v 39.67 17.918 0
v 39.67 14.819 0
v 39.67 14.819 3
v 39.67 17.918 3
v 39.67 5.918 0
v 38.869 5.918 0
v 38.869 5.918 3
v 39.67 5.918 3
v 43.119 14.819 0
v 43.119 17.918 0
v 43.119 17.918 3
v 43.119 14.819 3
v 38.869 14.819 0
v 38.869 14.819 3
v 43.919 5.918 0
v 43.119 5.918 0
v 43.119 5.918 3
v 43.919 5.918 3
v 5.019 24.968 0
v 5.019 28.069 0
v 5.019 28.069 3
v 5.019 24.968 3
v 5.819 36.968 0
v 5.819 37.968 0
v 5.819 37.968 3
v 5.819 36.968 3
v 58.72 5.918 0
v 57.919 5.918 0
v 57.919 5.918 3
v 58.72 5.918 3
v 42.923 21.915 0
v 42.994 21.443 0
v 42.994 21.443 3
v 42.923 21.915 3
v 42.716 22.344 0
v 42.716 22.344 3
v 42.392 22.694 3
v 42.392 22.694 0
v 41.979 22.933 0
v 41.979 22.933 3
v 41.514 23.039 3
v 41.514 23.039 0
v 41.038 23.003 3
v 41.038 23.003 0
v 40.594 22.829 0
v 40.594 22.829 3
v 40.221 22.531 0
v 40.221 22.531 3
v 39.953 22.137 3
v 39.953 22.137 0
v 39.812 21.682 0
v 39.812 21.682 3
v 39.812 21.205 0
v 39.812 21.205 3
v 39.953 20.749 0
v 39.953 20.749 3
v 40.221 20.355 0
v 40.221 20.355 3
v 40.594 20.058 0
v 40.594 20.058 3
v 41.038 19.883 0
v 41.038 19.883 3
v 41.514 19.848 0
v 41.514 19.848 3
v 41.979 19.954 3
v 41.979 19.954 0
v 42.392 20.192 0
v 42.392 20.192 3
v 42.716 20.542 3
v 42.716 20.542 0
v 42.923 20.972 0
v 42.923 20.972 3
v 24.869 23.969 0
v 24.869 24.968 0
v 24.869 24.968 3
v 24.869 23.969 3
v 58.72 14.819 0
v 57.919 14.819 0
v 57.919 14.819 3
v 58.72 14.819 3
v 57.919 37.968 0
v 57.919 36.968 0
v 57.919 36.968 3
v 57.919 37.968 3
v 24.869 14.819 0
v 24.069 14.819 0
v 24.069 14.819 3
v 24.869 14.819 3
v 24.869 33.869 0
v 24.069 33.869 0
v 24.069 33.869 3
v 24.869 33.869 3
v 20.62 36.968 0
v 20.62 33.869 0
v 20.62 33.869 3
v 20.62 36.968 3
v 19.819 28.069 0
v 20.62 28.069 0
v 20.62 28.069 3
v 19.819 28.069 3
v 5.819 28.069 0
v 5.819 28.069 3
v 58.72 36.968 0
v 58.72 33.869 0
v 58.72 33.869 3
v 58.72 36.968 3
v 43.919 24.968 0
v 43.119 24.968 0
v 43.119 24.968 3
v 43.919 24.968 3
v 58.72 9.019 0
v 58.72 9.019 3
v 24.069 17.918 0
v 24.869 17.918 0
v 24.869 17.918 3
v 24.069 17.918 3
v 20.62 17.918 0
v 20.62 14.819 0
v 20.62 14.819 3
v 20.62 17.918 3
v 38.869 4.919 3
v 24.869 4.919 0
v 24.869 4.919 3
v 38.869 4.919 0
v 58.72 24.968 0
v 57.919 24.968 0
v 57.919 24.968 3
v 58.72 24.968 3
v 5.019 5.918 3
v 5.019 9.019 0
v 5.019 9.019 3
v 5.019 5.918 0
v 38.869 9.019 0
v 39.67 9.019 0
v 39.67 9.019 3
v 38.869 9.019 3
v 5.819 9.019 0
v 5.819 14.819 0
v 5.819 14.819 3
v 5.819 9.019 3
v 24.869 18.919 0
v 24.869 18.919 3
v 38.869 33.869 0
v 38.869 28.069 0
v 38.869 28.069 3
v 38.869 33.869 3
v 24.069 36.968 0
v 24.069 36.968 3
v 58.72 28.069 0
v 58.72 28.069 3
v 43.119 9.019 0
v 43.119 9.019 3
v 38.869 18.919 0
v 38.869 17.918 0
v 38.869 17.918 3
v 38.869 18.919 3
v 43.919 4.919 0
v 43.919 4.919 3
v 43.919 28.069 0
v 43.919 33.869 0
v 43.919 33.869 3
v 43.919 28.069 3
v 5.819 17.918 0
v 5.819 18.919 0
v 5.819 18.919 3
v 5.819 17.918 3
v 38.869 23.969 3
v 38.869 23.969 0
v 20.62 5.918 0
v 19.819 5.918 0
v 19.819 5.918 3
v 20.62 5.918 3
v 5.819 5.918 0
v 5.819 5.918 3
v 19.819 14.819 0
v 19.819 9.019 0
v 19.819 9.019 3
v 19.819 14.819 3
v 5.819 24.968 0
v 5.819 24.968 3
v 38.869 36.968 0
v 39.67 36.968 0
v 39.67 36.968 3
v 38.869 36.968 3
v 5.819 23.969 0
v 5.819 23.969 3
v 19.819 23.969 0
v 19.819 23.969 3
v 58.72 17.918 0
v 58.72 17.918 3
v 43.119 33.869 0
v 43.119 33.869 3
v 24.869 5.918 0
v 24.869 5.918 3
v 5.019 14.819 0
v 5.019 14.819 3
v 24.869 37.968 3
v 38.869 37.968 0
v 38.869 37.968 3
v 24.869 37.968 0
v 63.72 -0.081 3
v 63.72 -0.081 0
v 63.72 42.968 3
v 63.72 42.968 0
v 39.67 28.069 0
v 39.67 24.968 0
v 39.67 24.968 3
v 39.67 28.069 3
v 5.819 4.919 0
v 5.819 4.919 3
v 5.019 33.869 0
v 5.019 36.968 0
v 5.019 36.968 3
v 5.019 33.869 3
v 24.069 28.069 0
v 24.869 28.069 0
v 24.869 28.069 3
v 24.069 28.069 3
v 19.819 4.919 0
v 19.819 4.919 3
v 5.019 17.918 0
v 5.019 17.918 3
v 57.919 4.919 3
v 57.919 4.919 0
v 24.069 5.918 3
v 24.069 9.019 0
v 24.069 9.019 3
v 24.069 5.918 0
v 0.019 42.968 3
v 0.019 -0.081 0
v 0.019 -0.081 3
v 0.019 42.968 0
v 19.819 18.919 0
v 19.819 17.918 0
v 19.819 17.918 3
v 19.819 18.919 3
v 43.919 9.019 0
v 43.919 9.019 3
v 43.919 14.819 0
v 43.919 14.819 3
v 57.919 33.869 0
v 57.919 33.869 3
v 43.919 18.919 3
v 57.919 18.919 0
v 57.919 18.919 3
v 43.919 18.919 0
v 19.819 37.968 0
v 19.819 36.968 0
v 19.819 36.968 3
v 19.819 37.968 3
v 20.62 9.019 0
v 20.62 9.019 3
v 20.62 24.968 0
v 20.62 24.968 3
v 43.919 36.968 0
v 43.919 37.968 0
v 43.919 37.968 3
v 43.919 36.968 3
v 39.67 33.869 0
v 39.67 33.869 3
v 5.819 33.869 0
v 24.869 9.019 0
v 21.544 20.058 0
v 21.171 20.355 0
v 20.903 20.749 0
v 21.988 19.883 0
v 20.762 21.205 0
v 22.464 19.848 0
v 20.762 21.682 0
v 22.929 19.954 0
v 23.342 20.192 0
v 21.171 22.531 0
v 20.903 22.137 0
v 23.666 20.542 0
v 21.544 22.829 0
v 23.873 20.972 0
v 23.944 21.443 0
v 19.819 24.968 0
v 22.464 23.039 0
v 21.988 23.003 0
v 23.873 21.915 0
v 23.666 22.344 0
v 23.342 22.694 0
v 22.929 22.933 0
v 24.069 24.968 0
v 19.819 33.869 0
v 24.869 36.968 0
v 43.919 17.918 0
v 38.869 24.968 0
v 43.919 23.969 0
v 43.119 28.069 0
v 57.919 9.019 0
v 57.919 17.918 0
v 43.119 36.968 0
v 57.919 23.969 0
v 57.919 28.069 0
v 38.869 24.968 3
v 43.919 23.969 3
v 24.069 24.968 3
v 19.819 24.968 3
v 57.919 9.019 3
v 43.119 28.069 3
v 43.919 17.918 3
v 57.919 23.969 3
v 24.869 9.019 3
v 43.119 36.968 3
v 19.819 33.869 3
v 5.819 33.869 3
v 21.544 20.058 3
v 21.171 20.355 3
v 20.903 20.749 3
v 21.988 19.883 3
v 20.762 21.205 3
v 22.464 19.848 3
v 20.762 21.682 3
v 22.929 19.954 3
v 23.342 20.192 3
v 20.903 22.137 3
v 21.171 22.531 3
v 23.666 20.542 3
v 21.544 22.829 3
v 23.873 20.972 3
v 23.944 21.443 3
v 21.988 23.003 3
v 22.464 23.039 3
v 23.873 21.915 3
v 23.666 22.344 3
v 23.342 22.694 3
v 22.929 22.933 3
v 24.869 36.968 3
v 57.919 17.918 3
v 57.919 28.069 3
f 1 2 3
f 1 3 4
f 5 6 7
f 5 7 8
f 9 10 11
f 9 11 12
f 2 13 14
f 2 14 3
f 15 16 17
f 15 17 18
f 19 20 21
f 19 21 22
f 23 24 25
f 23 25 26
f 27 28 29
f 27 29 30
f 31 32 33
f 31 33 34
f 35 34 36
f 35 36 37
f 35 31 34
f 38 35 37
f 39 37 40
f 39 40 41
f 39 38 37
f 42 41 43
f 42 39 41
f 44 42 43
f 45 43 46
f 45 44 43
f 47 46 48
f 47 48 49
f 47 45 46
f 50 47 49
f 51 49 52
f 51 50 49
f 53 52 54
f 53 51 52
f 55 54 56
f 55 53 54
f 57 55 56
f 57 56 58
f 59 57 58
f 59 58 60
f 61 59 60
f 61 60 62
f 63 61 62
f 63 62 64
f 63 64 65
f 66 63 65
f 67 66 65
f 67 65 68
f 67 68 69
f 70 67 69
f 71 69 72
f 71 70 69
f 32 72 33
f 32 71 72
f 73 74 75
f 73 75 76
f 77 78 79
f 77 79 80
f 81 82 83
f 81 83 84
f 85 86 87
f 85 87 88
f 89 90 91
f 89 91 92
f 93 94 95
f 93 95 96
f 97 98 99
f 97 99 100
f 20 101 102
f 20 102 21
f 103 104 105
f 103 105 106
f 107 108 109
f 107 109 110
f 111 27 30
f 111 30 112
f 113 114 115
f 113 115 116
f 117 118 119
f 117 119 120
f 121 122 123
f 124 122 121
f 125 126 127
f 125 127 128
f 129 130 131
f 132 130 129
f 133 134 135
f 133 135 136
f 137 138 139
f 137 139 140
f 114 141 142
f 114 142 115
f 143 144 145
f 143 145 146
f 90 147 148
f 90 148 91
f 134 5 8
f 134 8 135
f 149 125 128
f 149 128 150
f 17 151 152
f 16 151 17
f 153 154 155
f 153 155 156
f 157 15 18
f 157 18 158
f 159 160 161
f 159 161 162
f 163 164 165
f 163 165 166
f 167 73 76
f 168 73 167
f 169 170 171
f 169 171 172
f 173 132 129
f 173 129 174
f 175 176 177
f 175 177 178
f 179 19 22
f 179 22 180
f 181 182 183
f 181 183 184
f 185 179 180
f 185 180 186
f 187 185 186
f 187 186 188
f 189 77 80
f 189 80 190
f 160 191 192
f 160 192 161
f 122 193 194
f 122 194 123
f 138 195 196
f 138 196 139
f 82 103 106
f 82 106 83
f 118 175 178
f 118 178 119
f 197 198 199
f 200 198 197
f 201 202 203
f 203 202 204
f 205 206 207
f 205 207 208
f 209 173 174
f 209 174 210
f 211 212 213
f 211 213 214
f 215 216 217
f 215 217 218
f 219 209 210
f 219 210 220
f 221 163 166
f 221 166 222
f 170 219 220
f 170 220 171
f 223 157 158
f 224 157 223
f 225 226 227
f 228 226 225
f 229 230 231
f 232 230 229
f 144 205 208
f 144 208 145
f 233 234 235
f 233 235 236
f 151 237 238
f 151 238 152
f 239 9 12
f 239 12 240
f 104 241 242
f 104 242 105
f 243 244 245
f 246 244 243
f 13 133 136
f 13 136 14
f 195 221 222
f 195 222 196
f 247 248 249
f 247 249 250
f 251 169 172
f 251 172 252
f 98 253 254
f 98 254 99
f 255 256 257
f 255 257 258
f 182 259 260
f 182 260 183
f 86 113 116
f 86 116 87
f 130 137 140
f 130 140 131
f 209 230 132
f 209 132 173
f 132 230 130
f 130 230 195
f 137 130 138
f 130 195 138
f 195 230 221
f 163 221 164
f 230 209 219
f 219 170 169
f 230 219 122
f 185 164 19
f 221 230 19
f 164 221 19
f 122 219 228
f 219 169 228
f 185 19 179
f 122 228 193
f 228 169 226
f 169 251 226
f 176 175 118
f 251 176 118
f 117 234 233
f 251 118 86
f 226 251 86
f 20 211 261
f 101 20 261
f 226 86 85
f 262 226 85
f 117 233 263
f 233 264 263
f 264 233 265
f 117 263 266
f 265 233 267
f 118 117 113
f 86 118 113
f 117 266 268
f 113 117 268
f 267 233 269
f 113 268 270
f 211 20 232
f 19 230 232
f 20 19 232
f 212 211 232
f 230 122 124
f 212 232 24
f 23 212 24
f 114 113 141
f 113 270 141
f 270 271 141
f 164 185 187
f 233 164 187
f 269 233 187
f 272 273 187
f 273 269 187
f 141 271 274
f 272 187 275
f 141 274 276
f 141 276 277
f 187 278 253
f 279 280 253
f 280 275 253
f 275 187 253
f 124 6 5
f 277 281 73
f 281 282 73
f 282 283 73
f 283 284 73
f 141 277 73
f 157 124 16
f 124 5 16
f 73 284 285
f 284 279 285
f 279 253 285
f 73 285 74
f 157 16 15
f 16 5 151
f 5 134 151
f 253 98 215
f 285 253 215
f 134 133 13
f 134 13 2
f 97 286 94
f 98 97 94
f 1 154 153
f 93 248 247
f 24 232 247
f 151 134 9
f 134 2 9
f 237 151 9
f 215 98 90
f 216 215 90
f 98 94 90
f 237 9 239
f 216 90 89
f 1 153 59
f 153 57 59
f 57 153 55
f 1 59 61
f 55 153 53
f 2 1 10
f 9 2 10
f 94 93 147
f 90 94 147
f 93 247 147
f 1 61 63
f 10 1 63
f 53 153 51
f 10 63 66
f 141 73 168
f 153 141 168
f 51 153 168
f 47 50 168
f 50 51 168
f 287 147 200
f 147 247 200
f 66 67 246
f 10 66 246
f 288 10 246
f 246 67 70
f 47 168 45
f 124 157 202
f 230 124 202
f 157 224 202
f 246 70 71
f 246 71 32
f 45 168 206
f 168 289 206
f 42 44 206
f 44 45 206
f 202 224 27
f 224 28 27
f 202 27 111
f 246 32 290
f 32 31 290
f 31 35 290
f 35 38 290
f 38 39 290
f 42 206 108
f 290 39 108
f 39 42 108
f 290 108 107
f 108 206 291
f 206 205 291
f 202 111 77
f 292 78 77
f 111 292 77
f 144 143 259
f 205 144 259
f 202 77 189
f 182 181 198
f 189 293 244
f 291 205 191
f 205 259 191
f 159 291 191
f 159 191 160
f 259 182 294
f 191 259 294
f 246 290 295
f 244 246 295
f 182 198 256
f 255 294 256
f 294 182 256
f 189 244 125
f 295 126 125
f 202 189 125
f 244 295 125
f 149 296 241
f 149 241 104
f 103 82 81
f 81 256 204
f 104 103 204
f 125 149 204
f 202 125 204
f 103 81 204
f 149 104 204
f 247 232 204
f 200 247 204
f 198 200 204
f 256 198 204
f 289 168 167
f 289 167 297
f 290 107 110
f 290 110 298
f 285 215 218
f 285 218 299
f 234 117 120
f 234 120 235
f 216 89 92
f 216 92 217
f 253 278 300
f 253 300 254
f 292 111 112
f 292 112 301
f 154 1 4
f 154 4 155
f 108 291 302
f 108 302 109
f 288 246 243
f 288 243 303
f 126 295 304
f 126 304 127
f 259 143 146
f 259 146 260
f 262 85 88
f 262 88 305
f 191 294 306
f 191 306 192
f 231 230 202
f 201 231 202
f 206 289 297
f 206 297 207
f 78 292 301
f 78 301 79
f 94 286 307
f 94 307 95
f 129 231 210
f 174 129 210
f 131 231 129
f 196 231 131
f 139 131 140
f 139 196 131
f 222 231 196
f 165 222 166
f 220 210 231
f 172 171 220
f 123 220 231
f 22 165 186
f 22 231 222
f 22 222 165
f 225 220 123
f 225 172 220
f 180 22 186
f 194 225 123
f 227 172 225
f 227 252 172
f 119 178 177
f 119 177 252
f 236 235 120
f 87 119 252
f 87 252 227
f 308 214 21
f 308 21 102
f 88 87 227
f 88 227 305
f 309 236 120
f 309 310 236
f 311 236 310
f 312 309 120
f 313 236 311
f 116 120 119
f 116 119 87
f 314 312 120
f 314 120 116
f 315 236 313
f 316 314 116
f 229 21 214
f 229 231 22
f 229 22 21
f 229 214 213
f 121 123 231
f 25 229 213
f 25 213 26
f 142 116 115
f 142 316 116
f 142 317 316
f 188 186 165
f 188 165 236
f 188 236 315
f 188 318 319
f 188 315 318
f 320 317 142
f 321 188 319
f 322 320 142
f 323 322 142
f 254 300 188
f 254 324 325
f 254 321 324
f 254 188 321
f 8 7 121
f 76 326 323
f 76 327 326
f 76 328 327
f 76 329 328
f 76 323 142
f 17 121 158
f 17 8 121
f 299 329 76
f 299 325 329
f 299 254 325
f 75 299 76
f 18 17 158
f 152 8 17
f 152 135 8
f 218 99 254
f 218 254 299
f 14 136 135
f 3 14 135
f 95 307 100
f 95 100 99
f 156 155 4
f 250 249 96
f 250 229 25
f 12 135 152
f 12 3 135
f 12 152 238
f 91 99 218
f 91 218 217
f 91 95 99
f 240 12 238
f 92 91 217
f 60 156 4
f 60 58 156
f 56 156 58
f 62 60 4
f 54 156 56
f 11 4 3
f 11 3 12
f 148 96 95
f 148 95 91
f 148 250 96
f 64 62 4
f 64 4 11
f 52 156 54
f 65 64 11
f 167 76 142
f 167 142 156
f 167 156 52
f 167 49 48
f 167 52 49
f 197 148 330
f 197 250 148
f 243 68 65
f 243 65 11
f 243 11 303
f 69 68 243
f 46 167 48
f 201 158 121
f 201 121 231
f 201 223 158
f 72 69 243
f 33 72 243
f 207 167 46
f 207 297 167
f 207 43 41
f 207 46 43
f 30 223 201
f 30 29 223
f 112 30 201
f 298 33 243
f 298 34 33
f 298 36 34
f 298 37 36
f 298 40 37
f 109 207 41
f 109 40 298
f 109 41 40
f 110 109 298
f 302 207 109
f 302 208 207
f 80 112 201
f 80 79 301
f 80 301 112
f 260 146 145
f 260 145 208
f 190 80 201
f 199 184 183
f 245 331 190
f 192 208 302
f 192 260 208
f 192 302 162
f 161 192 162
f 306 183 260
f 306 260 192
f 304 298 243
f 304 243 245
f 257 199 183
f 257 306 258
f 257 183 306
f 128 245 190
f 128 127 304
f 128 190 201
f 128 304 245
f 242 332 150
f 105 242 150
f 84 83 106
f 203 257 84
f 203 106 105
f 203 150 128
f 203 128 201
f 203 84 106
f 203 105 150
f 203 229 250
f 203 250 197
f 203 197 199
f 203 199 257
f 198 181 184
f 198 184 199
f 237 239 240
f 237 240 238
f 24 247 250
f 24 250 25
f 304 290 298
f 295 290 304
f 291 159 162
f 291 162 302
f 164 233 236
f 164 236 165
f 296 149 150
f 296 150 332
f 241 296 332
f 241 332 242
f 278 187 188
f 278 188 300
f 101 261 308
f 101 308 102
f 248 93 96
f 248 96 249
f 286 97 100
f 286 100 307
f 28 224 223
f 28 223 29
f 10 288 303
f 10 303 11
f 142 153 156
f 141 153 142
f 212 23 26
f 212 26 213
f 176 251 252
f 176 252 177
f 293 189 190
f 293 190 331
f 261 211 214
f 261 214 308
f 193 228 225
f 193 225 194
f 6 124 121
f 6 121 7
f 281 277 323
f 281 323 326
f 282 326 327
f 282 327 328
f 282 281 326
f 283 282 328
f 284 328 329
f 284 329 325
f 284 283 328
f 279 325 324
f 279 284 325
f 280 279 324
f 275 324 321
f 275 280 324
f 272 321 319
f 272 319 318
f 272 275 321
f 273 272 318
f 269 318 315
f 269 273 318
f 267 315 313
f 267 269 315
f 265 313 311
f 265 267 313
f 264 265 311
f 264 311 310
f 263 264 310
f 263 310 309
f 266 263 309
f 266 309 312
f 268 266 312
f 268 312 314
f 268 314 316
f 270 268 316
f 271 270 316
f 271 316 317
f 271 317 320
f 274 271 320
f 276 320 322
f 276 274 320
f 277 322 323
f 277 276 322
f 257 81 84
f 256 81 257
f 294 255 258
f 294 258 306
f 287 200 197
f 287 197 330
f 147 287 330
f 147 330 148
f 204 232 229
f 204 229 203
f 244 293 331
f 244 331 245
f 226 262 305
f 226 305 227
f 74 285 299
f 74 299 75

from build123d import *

# Parameters (mm, degrees)
MODEL_W         = 63.70079
MODEL_H         = 43.04936
MODEL_R         = 1.6
EXTRUDE_1_DEPTH = 3


with BuildPart() as part:
    # Model → 凸台-拉伸1 (new body)
    with BuildSketch(Plane.XY):
        with Locations((31.869154462, 21.443783961)):
            Rectangle(MODEL_W, MODEL_H)
        with Locations((22.344199462, 21.443163961)):
            Circle(MODEL_R, mode=Mode.SUBTRACT)
        with Locations((41.394099462, 21.443163961)):
            Circle(MODEL_R, mode=Mode.SUBTRACT)
        Polygon((43.919449462, 18.918563961), (43.919449462, 17.918163961), (43.118649462, 17.918163961), (43.118649462, 14.818963961), (43.919449462, 14.818963961), (43.919449462, 9.018753961), (43.118649462, 9.018753961), (43.118649462, 5.918193961), (43.919449462, 5.918193961), (43.919449462, 4.919103961), (57.918749462, 4.919103961), (57.918749462, 5.918193961), (58.719549462, 5.918193961), (58.719549462, 9.018753961), (57.918749462, 9.018753961), (57.918749462, 14.818963961), (58.719549462, 14.818963961), (58.719549462, 17.918163961), (57.918749462, 17.918163961), (57.918749462, 18.918563961), align=None, mode=Mode.SUBTRACT)
        Polygon((24.869449462, 18.918563961), (24.869449462, 17.918163961), (24.068749462, 17.918163961), (24.068749462, 14.818963961), (24.869449462, 14.818963961), (24.869449462, 9.018753961), (24.068749462, 9.018753961), (24.068749462, 5.918193961), (24.869449462, 5.918193961), (24.869449462, 4.919103961), (38.868749462, 4.919103961), (38.868749462, 5.918193961), (39.669549462, 5.918193961), (39.669549462, 9.018753961), (38.868749462, 9.018753961), (38.868749462, 14.818963961), (39.669549462, 14.818963961), (39.669549462, 17.918163961), (38.868749462, 17.918163961), (38.868749462, 18.918563961), align=None, mode=Mode.SUBTRACT)
        Polygon((5.819399462, 18.918563961), (5.819399462, 17.918163961), (5.018759462, 17.918163961), (5.018759462, 14.818963961), (5.819399462, 14.818963961), (5.819399462, 9.018753961), (5.018759462, 9.018753961), (5.018759462, 5.918193961), (5.819399462, 5.918193961), (5.819399462, 4.919103961), (19.818949462, 4.919103961), (19.818949462, 5.918193961), (20.619549462, 5.918193961), (20.619549462, 9.018753961), (19.818949462, 9.018753961), (19.818949462, 14.818963961), (20.619549462, 14.818963961), (20.619549462, 17.918163961), (19.818949462, 17.918163961), (19.818949462, 18.918563961), align=None, mode=Mode.SUBTRACT)
        Polygon((43.919449462, 37.968463961), (43.919449462, 36.968163961), (43.118649462, 36.968163961), (43.118649462, 33.868963961), (43.919449462, 33.868963961), (43.919449462, 28.068763961), (43.118649462, 28.068763961), (43.118649462, 24.968163961), (43.919449462, 24.968163961), (43.919449462, 23.969063961), (57.918749462, 23.969063961), (57.918749462, 24.968163961), (58.719549462, 24.968163961), (58.719549462, 28.068763961), (57.918749462, 28.068763961), (57.918749462, 33.868963961), (58.719549462, 33.868963961), (58.719549462, 36.968163961), (57.918749462, 36.968163961), (57.918749462, 37.968463961), align=None, mode=Mode.SUBTRACT)
        Polygon((24.869449462, 37.968463961), (24.869449462, 36.968163961), (24.068749462, 36.968163961), (24.068749462, 33.868963961), (24.869449462, 33.868963961), (24.869449462, 28.068763961), (24.068749462, 28.068763961), (24.068749462, 24.968163961), (24.869449462, 24.968163961), (24.869449462, 23.969063961), (38.868749462, 23.969063961), (38.868749462, 24.968163961), (39.669549462, 24.968163961), (39.669549462, 28.068763961), (38.868749462, 28.068763961), (38.868749462, 33.868963961), (39.669549462, 33.868963961), (39.669549462, 36.968163961), (38.868749462, 36.968163961), (38.868749462, 37.968463961), align=None, mode=Mode.SUBTRACT)
        Polygon((5.819399462, 37.968463961), (5.819399462, 36.968163961), (5.018759462, 36.968163961), (5.018759462, 33.868963961), (5.819399462, 33.868963961), (5.819399462, 28.068763961), (5.018759462, 28.068763961), (5.018759462, 24.968163961), (5.819399462, 24.968163961), (5.819399462, 23.969063961), (19.818949462, 23.969063961), (19.818949462, 24.968163961), (20.619549462, 24.968163961), (20.619549462, 28.068763961), (19.818949462, 28.068763961), (19.818949462, 33.868963961), (20.619549462, 33.868963961), (20.619549462, 36.968163961), (19.818949462, 36.968163961), (19.818949462, 37.968463961), align=None, mode=Mode.SUBTRACT)
    extrude(amount=EXTRUDE_1_DEPTH)


solid = part.part
